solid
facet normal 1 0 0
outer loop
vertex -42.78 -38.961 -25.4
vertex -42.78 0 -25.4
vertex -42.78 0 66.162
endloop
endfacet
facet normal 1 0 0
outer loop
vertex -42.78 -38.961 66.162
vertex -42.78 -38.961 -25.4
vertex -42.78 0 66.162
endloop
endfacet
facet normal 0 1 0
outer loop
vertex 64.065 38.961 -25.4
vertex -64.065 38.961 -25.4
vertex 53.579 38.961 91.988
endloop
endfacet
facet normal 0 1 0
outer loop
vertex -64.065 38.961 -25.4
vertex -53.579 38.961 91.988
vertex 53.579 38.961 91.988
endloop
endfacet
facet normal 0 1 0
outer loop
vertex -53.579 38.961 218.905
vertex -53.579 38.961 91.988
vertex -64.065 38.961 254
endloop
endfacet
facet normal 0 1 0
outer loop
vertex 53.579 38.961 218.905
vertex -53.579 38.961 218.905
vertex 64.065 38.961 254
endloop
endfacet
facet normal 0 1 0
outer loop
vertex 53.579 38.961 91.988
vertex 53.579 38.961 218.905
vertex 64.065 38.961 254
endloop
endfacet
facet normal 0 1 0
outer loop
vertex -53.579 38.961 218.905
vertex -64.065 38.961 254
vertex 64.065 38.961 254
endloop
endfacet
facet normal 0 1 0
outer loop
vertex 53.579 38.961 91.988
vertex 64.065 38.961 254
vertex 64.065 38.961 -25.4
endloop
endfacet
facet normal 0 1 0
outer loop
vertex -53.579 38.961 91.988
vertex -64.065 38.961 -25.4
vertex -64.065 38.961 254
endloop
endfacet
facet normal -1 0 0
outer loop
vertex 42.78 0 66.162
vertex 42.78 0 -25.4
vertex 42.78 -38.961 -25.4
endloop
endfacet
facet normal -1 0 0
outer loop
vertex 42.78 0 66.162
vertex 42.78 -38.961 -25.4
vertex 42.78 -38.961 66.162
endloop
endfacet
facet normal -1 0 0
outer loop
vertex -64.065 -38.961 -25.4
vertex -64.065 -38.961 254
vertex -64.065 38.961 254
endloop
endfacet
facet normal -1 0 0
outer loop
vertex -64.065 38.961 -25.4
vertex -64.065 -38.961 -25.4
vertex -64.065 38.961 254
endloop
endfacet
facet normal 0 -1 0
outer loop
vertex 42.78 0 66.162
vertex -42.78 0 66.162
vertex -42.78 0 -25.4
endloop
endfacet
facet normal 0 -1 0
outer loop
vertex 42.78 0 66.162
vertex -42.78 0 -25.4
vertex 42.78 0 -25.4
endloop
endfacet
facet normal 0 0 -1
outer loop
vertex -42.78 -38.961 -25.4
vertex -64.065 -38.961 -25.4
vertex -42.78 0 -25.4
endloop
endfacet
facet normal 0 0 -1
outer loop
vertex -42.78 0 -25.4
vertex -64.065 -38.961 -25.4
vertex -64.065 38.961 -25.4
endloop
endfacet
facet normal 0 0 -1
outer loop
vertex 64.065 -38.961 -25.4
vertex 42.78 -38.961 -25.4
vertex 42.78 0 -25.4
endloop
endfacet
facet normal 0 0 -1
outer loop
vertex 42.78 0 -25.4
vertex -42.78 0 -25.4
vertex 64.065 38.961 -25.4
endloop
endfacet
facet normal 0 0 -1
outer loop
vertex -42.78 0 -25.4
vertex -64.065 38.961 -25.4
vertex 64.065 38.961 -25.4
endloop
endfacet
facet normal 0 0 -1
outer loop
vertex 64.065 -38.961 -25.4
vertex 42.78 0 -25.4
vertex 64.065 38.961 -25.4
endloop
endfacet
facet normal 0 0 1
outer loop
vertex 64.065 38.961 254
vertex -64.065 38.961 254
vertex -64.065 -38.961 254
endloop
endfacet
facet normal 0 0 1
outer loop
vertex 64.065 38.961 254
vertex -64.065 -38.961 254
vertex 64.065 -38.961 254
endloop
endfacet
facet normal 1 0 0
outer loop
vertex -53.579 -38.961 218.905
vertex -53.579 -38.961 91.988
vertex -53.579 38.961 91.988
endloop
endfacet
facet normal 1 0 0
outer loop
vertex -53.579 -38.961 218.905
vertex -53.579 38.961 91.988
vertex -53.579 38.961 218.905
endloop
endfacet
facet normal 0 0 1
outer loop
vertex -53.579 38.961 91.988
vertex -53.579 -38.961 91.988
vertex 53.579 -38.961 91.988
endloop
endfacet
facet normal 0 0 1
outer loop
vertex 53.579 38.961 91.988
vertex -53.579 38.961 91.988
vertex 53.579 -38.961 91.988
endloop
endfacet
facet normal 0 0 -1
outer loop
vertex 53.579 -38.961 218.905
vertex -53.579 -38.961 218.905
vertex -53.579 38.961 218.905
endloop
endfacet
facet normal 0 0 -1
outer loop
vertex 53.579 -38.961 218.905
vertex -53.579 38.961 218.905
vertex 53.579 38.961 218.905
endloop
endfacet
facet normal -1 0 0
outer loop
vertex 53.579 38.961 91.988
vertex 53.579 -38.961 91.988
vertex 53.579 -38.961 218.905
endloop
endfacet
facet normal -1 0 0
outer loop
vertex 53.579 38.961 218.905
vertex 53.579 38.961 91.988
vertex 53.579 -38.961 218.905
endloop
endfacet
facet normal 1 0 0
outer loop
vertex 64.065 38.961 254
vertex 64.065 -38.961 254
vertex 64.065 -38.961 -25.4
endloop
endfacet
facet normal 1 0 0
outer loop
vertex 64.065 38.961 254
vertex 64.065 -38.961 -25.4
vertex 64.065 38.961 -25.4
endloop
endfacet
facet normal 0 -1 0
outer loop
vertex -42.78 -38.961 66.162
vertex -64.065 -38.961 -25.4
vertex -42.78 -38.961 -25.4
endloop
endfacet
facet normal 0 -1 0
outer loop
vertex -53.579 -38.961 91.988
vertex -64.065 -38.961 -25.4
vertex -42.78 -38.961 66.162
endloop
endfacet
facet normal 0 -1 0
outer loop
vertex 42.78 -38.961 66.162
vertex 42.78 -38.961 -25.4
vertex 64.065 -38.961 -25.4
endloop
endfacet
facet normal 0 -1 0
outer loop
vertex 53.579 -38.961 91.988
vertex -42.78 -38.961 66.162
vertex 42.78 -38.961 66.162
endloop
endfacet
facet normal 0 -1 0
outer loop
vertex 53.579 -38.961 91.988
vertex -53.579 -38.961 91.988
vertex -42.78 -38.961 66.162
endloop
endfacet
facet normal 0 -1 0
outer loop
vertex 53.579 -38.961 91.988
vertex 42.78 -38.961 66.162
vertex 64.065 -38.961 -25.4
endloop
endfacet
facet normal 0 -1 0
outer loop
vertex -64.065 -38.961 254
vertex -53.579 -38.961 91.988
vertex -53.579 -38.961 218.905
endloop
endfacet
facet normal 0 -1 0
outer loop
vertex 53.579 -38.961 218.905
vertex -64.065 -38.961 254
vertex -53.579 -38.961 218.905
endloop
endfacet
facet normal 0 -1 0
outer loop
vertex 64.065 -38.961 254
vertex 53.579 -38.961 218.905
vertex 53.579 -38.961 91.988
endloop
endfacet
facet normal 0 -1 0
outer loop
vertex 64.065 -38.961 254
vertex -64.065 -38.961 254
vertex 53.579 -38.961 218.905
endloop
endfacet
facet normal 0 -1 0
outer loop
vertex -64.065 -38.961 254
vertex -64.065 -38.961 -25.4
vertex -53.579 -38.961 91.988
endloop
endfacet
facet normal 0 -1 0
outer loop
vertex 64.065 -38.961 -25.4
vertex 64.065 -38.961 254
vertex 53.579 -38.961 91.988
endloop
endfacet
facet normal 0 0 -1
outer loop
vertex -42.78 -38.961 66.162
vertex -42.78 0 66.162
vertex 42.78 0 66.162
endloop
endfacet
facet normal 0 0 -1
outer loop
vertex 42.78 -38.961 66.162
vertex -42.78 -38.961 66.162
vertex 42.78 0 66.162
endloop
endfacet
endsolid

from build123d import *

# Parameters (mm, degrees)
F0_W          = 128.129378
F0_H          = 77.922702
F1_DEPTH      = 254
F1_DEPTH_BACK = 25.4
F2_W          = 85.559396
F2_H          = 132.324406
F3_DEPTH      = 254
F4_W          = 107.157492
F4_H          = 126.91684
F5_DEPTH      = 127


with BuildPart() as f1:
    # F0 (on Top) → F1 (new body, two sides)
    with BuildSketch(Plane.XY) as f1_sk:
        Rectangle(F0_W, F0_H)
    extrude(amount=F1_DEPTH)
    extrude(f1_sk.sketch, amount=-F1_DEPTH_BACK)

    # F2 (on Front) → F3 (cut)
    with BuildSketch(Plane.XZ):
        Rectangle(F2_W, F2_H)
    extrude(amount=F3_DEPTH, mode=Mode.SUBTRACT)

    # F4 (on Front) → F5 (cut, symmetric)
    with BuildSketch(Plane.XZ):
        with Locations((0, 155.446574)):
            Rectangle(F4_W, F4_H)
    extrude(amount=F5_DEPTH, both=True, mode=Mode.SUBTRACT)


solid = f1.part
